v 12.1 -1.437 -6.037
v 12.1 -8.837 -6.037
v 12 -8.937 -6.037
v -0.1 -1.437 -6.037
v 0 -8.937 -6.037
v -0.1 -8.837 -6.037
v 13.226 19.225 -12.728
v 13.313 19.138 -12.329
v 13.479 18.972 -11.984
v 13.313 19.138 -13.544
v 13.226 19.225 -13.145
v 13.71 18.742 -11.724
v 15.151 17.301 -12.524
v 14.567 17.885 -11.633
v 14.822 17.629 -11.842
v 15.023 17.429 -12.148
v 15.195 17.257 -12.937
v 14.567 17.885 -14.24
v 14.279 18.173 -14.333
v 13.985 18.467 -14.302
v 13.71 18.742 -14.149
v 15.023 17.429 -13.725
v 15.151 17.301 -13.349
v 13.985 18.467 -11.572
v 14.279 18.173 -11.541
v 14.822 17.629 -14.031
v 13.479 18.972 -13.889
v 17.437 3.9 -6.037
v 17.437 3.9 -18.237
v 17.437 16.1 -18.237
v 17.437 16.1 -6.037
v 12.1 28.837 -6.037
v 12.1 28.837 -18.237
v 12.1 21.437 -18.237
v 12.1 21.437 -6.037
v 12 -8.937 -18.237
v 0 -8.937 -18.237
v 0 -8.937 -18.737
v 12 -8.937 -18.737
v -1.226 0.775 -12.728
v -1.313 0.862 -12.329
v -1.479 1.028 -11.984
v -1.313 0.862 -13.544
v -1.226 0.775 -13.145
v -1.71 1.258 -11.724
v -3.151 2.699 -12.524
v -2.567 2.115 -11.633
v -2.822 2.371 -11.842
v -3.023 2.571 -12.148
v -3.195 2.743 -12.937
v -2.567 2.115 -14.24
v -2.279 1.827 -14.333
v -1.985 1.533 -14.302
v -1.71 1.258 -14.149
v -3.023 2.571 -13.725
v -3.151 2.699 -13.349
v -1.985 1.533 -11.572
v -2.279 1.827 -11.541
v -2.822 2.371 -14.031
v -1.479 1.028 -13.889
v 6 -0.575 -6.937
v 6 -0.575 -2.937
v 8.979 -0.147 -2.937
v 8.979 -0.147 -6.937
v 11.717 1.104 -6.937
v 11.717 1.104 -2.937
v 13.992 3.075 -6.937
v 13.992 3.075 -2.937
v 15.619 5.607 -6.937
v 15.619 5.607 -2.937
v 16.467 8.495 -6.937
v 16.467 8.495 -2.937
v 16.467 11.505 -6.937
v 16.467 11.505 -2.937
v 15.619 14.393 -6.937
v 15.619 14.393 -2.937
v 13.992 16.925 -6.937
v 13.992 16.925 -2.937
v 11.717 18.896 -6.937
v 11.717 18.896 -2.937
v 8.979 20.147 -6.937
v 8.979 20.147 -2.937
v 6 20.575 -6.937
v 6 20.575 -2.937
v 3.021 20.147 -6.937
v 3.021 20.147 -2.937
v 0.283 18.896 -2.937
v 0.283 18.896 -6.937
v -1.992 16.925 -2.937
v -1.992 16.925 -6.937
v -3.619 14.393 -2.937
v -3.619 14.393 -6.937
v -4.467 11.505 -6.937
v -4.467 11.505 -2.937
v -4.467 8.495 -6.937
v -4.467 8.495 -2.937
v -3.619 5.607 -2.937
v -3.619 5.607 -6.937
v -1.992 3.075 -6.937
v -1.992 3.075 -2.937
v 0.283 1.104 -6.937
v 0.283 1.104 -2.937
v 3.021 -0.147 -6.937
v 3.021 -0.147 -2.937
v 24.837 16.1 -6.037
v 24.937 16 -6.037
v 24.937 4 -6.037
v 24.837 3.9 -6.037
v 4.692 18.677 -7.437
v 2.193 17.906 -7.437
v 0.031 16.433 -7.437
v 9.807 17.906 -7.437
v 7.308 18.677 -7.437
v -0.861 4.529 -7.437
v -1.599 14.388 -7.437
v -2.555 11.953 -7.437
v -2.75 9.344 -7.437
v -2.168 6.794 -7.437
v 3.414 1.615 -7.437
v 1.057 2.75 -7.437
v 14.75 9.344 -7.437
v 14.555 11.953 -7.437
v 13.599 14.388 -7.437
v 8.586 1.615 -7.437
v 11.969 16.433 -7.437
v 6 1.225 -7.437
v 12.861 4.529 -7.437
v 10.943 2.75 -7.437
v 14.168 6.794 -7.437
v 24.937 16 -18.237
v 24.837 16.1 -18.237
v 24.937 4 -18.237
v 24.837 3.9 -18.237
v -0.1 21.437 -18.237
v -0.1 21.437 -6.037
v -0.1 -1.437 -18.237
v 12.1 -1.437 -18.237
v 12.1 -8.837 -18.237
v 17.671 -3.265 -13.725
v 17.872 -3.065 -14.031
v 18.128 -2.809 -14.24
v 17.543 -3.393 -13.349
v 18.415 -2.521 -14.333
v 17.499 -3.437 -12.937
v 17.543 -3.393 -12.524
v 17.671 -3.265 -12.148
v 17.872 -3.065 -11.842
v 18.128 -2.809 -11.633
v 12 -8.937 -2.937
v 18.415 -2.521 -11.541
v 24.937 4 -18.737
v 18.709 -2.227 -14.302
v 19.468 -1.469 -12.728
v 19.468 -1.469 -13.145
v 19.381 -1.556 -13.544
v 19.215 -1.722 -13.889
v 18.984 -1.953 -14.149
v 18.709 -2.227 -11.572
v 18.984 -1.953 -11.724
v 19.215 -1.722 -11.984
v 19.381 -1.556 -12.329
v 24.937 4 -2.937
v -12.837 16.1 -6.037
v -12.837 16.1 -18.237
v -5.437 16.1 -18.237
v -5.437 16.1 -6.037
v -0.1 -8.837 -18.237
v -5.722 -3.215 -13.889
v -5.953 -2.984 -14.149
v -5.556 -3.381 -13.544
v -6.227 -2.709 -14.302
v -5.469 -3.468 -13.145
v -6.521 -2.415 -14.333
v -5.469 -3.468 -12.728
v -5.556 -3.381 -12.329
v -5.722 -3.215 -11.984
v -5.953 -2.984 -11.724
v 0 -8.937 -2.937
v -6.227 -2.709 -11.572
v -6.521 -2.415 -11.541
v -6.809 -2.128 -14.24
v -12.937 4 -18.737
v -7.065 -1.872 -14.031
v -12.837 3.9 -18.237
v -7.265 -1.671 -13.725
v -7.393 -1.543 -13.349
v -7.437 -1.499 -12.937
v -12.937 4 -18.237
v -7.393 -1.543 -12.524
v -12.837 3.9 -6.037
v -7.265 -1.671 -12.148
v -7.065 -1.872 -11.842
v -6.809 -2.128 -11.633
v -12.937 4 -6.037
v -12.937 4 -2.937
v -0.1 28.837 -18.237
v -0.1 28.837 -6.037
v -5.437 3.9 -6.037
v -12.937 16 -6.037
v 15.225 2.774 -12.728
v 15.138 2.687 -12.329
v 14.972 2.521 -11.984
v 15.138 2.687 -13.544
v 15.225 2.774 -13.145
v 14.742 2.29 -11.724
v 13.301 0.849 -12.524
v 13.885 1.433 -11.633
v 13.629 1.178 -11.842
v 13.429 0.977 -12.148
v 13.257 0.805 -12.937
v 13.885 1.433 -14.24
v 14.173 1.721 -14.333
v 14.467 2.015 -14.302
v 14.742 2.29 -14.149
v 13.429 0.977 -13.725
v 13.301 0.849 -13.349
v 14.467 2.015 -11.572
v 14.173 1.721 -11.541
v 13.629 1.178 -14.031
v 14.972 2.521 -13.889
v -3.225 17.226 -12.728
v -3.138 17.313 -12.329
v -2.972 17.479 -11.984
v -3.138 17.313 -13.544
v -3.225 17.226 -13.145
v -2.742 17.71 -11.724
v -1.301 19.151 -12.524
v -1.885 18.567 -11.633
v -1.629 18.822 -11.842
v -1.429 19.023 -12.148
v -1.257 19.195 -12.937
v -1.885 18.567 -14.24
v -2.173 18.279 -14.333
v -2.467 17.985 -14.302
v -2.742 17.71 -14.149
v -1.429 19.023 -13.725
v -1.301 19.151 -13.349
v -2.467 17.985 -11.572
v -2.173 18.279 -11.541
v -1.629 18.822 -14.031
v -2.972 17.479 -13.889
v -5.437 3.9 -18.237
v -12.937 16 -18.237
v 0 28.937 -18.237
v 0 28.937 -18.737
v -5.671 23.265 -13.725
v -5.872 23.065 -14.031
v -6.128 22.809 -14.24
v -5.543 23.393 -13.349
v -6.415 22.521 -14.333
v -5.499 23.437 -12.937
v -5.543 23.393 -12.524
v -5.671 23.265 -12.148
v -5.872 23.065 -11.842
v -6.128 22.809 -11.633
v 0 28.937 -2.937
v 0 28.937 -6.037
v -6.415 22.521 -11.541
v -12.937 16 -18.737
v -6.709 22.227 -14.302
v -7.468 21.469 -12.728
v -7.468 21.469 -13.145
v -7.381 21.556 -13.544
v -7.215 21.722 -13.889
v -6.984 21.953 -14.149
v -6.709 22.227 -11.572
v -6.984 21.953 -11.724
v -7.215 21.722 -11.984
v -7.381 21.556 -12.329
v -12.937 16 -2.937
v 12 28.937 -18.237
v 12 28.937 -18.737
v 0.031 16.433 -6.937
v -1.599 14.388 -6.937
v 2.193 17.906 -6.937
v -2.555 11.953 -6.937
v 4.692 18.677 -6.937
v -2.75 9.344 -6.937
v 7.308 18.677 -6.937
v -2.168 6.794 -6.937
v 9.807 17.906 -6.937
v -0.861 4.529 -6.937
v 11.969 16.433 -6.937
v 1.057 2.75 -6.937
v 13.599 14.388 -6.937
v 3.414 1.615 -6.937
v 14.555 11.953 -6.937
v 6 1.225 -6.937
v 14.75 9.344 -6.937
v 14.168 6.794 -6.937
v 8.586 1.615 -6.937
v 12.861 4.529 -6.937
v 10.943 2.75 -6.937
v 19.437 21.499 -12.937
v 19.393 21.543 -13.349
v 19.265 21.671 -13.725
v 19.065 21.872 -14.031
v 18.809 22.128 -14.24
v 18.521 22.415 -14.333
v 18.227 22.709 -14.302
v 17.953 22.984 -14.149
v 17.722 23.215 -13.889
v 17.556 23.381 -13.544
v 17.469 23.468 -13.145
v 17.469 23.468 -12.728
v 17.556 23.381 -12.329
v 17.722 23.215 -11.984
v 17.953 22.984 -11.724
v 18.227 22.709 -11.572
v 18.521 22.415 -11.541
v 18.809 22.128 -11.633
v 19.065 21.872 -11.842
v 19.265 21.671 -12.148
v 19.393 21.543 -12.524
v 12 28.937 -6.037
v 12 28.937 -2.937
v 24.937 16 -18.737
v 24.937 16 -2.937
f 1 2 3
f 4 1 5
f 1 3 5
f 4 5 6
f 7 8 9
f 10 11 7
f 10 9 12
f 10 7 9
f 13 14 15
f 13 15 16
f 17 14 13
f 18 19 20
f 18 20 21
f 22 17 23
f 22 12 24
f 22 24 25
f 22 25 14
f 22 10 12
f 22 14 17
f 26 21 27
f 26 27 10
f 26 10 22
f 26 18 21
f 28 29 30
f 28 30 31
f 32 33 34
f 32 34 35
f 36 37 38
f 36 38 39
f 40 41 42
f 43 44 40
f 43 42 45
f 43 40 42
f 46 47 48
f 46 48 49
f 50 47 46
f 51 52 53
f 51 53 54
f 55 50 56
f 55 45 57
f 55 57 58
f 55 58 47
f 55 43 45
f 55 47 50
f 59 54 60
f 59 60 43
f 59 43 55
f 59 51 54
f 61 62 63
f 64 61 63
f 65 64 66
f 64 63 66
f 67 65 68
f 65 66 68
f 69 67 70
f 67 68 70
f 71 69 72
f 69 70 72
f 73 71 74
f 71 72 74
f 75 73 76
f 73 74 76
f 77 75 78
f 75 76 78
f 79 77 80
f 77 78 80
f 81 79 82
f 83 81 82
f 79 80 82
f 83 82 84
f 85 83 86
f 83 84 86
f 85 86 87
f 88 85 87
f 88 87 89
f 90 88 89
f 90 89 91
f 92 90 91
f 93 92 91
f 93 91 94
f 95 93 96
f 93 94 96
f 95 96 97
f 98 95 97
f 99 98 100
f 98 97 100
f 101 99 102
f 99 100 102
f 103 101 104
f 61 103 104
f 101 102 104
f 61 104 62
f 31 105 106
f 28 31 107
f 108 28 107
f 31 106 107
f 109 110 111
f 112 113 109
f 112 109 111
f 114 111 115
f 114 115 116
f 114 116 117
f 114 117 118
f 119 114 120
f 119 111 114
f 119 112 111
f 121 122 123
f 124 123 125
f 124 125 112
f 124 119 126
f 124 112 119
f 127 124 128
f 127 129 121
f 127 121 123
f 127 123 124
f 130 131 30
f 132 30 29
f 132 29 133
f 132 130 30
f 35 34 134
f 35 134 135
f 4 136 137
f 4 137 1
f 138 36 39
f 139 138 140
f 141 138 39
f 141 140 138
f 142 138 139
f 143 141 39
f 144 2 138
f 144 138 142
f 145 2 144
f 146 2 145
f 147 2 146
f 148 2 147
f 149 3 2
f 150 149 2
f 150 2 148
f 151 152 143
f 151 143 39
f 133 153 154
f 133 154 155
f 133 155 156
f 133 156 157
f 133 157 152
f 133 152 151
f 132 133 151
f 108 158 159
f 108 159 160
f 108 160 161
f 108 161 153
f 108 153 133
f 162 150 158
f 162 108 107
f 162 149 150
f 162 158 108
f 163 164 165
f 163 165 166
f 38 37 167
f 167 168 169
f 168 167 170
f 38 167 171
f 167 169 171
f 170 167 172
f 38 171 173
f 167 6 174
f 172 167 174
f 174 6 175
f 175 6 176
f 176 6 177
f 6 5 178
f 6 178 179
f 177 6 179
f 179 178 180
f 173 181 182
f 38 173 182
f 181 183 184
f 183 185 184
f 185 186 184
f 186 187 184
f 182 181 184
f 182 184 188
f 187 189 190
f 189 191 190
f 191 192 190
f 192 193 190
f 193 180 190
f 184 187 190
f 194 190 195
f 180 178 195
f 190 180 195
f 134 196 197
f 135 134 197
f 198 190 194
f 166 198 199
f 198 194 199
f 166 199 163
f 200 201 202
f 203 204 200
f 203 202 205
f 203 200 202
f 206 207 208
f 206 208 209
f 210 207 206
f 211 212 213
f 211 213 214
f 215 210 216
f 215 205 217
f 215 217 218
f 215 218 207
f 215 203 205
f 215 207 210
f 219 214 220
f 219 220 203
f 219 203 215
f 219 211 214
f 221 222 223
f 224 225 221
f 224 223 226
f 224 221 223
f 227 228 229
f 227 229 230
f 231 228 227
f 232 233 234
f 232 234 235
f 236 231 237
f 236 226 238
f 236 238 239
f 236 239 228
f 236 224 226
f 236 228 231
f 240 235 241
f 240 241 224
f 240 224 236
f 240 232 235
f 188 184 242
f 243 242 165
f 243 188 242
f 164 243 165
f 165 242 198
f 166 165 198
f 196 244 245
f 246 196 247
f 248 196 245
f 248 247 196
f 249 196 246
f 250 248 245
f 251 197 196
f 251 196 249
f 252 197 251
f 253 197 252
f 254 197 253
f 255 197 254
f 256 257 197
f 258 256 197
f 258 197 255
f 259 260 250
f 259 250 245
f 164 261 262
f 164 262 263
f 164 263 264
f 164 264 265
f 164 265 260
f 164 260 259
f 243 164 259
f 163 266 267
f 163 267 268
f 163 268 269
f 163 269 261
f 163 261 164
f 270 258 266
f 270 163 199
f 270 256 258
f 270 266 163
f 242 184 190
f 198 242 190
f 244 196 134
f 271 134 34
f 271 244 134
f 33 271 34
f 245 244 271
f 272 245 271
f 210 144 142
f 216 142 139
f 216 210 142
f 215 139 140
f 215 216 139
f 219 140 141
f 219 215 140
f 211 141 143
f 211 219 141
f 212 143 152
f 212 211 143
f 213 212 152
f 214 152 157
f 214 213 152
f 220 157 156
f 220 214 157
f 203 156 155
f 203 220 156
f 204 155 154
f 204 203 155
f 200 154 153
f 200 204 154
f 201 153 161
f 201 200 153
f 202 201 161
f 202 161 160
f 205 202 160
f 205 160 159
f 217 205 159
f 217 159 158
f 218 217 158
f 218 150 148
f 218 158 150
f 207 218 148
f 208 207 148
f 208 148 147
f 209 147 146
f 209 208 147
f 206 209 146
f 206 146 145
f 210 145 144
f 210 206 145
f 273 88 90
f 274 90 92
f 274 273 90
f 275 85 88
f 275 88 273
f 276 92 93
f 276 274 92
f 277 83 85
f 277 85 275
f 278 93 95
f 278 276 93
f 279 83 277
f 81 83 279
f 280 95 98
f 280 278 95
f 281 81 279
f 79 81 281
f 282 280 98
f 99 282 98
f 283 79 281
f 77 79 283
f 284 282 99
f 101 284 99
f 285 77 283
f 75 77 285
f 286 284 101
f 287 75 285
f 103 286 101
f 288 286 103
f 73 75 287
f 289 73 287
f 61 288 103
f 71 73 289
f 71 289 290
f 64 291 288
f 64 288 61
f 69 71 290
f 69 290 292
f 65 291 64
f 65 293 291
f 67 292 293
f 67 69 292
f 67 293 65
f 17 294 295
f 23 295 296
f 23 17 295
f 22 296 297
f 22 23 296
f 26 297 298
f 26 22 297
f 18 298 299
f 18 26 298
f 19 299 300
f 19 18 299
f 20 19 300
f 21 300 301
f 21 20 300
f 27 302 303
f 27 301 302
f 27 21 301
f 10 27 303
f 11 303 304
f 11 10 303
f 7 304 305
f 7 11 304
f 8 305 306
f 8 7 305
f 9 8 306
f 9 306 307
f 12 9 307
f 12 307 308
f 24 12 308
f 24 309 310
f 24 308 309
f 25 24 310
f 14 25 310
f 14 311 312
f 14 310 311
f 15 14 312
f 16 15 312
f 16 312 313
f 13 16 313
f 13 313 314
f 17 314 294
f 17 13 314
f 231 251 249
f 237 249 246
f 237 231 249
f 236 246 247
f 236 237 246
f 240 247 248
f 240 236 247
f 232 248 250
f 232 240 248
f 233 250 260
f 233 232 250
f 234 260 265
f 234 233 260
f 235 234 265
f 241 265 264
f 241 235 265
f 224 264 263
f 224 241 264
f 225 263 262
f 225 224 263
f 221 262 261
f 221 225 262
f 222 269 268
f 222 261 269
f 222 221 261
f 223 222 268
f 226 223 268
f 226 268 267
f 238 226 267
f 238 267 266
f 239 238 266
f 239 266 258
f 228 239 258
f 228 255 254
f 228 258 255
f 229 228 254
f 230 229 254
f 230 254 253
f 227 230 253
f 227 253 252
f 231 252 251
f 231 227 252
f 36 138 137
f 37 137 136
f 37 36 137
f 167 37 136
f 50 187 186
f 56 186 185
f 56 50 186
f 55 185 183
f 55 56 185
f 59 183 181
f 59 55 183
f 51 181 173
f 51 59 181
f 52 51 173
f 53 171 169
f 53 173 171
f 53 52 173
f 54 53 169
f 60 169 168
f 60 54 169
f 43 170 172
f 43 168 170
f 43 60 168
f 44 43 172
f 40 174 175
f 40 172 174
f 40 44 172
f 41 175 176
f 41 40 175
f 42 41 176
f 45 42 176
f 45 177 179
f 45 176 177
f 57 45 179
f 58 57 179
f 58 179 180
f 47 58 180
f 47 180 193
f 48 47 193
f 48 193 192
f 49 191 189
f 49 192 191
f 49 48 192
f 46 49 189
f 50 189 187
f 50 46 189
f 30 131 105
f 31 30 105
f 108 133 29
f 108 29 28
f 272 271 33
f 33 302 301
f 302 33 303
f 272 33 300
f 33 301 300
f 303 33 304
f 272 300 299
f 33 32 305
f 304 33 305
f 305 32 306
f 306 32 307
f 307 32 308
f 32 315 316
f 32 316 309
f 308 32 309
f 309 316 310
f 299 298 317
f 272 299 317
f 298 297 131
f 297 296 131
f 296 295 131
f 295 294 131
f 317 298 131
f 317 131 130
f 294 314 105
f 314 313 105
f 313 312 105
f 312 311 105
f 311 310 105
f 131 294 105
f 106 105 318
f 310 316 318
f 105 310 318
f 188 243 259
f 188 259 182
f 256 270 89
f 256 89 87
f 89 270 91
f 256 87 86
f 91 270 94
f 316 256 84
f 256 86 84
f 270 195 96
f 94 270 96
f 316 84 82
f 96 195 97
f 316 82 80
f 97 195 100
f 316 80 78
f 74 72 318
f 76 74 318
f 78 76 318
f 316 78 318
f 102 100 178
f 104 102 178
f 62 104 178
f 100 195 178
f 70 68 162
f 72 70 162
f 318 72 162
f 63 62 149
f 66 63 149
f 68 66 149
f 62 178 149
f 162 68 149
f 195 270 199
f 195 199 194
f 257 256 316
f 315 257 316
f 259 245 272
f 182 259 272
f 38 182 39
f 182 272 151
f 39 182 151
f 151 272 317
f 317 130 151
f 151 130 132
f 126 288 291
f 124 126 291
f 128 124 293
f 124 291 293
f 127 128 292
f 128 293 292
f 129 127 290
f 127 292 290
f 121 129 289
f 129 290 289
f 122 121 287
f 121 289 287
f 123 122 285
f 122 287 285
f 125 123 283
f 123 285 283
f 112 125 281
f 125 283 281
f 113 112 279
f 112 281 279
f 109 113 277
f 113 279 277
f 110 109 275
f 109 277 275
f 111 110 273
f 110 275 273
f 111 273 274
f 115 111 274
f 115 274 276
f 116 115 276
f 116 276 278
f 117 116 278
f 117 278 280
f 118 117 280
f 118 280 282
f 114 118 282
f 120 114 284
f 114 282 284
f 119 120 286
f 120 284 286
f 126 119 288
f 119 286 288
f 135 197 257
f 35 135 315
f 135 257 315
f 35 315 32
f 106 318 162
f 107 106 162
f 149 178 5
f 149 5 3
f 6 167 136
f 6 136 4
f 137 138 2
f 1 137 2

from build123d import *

# Parameters (mm, degrees)
SKIZZE1_W                          = 37.873435046
SKIZZE1_H                          = 37.873435047
AUFSATZ_LINEAR_AUSTRAGEN1_DEPTH    = 20
SKIZZE2_R                          = 10.575
SCHNITT_LINEAR_AUSTRAGEN1_DEPTH    = 4
SKIZZE3_W                          = 12
SKIZZE3_H                          = 12
SCHNITT_LINEAR_AUSTRAGEN3_DEPTH    = 7.5
VERRUNDUNG1_R                      = 8
KREISMUSTER1_COUNT                 = 4
SKIZZE4_R                          = 8.775
SCHNITT_LINEAR_AUSTRAGEN4_DEPTH    = 0.5
K_RPER_VERSCHIEBEN_KOPIEREN1_ANGLE = 90
SCHNITT_LINEAR_AUSTRAGEN5_DEPTH    = 44.118134258
SCHNITT_LINEAR_START               = -6
SKIZZE6_R                          = 1.4
SCHNITT_LINEAR_AUSTRAGEN6_DEPTH    = 16
KREISMUSTER2_COUNT                 = 4
SKIZZE7_W                          = 35.652729611
SKIZZE7_H                          = 9.373531579
SCHNITT_LINEAR_AUSTRAGEN8_DEPTH    = 51.066462265
SKIZZE8_W                          = 12.2
SKIZZE8_H                          = 12.2
SCHNITT_LINEAR_AUSTRAGEN9_DEPTH    = 7.5
KREISMUSTER11_COUNT                = 4


with BuildPart() as part:
    # Skizze1 → Aufsatz-Linear austragen1 (new body)
    with BuildSketch(Plane(origin=(0, 0, 0), x_dir=(1, 0, 0), z_dir=(0, 1, 0))):
        with Locations((6, 12.936717524)):
            Rectangle(SKIZZE1_W, SKIZZE1_H)
    extrude(amount=AUFSATZ_LINEAR_AUSTRAGEN1_DEPTH)

    # Skizze2 → Schnitt-Linear austragen1 (cut)
    with BuildSketch(Plane.XZ):
        with Locations(Location((6, -12.936717523, 0), (0, 0, 270))):
            Circle(SKIZZE2_R)
    extrude(amount=-SCHNITT_LINEAR_AUSTRAGEN1_DEPTH, mode=Mode.SUBTRACT)

    # Skizze3 → Schnitt-Linear austragen3 (cut)
    with BuildSketch(Plane.XY.offset(6)):
        with Locations((6, 9.2)):
            Rectangle(SKIZZE3_W, SKIZZE3_H)
    schnitt_linear_austragen3 = extrude(amount=-SCHNITT_LINEAR_AUSTRAGEN3_DEPTH, mode=Mode.SUBTRACT)

    # Verrundung1
    verrundung1_edges = [part.edges().sort_by_distance(p)[0] for p in [
        (24.936717523, 10, -31.873435047),
        (24.936717523, 10, 6),
        (-12.936717523, 10, 6),
        (-12.936717523, 10, -31.873435047),
    ]]
    fillet(verrundung1_edges, radius=VERRUNDUNG1_R)

    # Kreismuster1: Schnitt-Linear austragen3 ×4 about axis
    kreismuster1_axis = Axis((6, 0, -12.936717523), (0, 1, 0))
    for i in range(1, KREISMUSTER1_COUNT):
        add(schnitt_linear_austragen3.rotate(kreismuster1_axis, i * 360 / KREISMUSTER1_COUNT), mode=Mode.SUBTRACT)

    # Skizze4 → Schnitt-Linear austragen4 (cut)
    with BuildSketch(Plane.XZ.offset(-4)):
        with Locations(Location((6, -12.936717523, 0), (0, 0, 270))):
            Circle(SKIZZE4_R)
    extrude(amount=-SCHNITT_LINEAR_AUSTRAGEN4_DEPTH, mode=Mode.SUBTRACT)


with BuildPart() as part_1:
    # Körper-Verschieben/Kopieren1: moved
    add(part.part.rotate(Axis((0, 10, -12.936717523), (-1, 0, 0)), K_RPER_VERSCHIEBEN_KOPIEREN1_ANGLE))

    # Skizze5 → Schnitt-Linear austragen5 (cut, through all)
    with BuildSketch(Plane.XY.offset(-2.936717523)):
        Polygon((0, 28.936717523), (-12.936717523, 16), (-12.936717523, 28.936717523), align=None)
        Polygon((24.936717523, 16), (24.936717523, 28.936717523), (12, 28.936717523), align=None)
        Polygon((12, -8.936717523), (24.936717523, 4), (24.936717523, -8.936717523), align=None)
        Polygon((-12.936717523, -8.936717523), (0, -8.936717523), (-12.936717523, 4), align=None)
    extrude(amount=-SCHNITT_LINEAR_AUSTRAGEN5_DEPTH, mode=Mode.SUBTRACT)

    # Skizze6 → Schnitt-Linear austragen6 (cut)
    with BuildSketch(Plane(origin=(-14.468358762, 14.468358762, 0), x_dir=(0.7071067811865559, 0.7071067811865392, 0), z_dir=(-0.7071067811865392, 0.7071067811865559, 0)).offset(SCHNITT_LINEAR_START)):
        with Locations((11.284238529, 12.936717523)):
            Circle(SKIZZE6_R)
    schnitt_linear_austragen6 = extrude(amount=SCHNITT_LINEAR_AUSTRAGEN6_DEPTH, mode=Mode.SUBTRACT)

    # Kreismuster2: Schnitt-Linear austragen6 ×4 about axis
    kreismuster2_axis = Axis((6, 10, 0), (0, 0, 1))
    for i in range(1, KREISMUSTER2_COUNT):
        add(schnitt_linear_austragen6.rotate(kreismuster2_axis, i * 360 / KREISMUSTER2_COUNT), mode=Mode.SUBTRACT)

    # Skizze7 → Schnitt-Linear austragen8 (cut, through all)
    with BuildSketch(Plane(origin=(20.468358762, 20.468358762, 0), x_dir=(0.7071067811865558, -0.7071067811865392, 0), z_dir=(0.7071067811865392, 0.7071067811865558, 0))):
        with Locations((-3.021869868, 23.423483313)):
            Rectangle(SKIZZE7_W, SKIZZE7_H)
    extrude(amount=-SCHNITT_LINEAR_AUSTRAGEN8_DEPTH, mode=Mode.SUBTRACT)

    # Skizze8 → Schnitt-Linear austragen9 (cut)
    with BuildSketch(Plane.ZY.offset(12.936717523)):
        with Locations((-12.136717523, 10)):
            Rectangle(SKIZZE8_W, SKIZZE8_H)
    schnitt_linear_austragen9 = extrude(amount=-SCHNITT_LINEAR_AUSTRAGEN9_DEPTH, mode=Mode.SUBTRACT)

    # Kreismuster11: Schnitt-Linear austragen9 ×4 about axis
    kreismuster11_axis = Axis((6, 10, 0), (0, 0, 1))
    for i in range(1, KREISMUSTER11_COUNT):
        add(schnitt_linear_austragen9.rotate(kreismuster11_axis, i * 360 / KREISMUSTER11_COUNT), mode=Mode.SUBTRACT)


solid = part_1.part
